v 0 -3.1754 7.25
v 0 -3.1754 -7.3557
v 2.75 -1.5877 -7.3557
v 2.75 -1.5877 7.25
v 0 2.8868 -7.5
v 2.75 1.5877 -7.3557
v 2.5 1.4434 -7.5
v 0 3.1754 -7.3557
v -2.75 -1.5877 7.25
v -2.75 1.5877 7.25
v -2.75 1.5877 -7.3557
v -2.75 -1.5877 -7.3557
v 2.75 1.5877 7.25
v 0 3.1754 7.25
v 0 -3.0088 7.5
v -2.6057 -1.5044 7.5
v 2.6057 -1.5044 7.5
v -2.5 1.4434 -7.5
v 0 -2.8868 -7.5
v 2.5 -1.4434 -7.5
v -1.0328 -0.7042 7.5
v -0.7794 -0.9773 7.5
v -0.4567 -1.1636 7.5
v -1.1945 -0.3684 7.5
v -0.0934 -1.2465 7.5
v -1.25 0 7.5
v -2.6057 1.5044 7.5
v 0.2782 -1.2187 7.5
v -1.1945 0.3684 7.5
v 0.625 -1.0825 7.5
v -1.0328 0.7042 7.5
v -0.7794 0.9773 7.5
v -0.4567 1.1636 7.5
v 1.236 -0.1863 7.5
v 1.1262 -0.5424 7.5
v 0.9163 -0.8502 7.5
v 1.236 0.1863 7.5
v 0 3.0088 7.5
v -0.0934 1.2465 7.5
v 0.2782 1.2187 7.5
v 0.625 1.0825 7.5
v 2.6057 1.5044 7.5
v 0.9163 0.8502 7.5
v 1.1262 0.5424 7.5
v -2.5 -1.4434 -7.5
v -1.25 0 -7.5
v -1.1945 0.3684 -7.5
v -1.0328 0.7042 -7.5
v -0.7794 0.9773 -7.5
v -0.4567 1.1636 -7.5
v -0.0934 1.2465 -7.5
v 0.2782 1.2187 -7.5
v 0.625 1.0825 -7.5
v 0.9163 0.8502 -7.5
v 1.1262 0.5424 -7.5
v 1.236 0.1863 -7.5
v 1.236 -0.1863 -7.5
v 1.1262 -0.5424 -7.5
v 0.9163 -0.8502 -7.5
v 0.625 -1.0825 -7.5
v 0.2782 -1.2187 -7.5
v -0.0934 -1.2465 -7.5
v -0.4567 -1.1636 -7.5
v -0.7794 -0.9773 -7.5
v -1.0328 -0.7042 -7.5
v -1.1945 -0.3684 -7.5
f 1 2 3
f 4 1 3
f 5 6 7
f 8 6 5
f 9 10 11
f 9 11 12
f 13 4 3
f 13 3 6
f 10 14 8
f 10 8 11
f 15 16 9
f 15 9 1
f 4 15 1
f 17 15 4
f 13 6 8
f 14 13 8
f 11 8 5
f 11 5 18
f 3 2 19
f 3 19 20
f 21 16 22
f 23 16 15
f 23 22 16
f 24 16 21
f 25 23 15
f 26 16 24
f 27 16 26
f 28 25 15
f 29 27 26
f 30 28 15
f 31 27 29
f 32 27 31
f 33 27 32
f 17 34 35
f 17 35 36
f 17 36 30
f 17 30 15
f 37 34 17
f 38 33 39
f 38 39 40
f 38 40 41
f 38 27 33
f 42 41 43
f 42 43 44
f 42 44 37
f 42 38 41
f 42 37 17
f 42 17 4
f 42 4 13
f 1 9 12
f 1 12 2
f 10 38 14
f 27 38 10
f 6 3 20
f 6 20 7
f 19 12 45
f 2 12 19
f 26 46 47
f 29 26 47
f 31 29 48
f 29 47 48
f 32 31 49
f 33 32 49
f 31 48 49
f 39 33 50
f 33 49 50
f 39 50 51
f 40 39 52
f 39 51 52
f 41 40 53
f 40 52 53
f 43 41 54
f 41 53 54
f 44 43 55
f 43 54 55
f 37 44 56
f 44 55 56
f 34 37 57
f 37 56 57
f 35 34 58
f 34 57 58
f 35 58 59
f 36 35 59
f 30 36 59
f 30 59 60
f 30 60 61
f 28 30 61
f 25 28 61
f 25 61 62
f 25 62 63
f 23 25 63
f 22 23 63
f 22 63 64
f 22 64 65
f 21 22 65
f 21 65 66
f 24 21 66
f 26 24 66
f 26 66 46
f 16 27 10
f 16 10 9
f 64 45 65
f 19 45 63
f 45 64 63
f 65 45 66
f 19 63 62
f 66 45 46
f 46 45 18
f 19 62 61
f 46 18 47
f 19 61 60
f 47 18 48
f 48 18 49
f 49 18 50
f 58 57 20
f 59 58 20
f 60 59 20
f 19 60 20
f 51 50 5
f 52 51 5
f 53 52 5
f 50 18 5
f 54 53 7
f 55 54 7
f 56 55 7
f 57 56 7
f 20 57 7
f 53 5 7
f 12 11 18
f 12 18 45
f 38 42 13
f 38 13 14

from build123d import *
from OCP.BRepFilletAPI import BRepFilletAPI_MakeChamfer

# Parameters (mm, degrees)
EXTRUDE_1_DEPTH    = 7.5
HOLE_WIZARD_M3_1_D = 2.5
CHAMFER_2_SIZE     = 0.25
CHAMFER_2_SIZE2    = 0.144337567


with BuildPart() as part:
    # ｽｹｯﾁ1 → ﾎﾞｽ - 押し出し1 (new, symmetric)
    with BuildSketch(Plane.XY):
        Polygon((-2.75, 1.58771324), (-2.75, -1.58771324), (0, -3.175426481), (2.75, -1.58771324), (2.75, 1.58771324), (0, 3.175426481), align=None)
    extrude(amount=EXTRUDE_1_DEPTH, both=True)

    # M3 ねじ穴1 (through all)
    with Locations(Plane.XY.offset(7.5)):
        with Locations((0, 0)):
            Hole(HOLE_WIZARD_M3_1_D / 2)

    # 面取り2: one chamfer whose edges measure the first distance from different faces: ONE call of the kernel's chamfer builder (chamfer() names one face for all edges)
    chamfer_2_edges_1 = [part.edges().sort_by_distance(p)[0] for p in [
        (-1.375, -2.38156986, 7.5),
    ]]
    chamfer_2_side_1 = [part.faces().sort_by_distance(p)[0] for p in [
        (-1.375, -2.38156986, 0),
    ]]
    chamfer_2_edges_2 = [part.edges().sort_by_distance(p)[0] for p in [
        (1.375, -2.38156986, 7.5),
    ]]
    chamfer_2_side_2 = [part.faces().sort_by_distance(p)[0] for p in [
        (1.375, -2.38156986, 0),
    ]]
    chamfer_2_edges_3 = [part.edges().sort_by_distance(p)[0] for p in [
        (2.75, 0, 7.5),
    ]]
    chamfer_2_side_3 = [part.faces().sort_by_distance(p)[0] for p in [
        (2.75, 0, 0),
    ]]
    chamfer_2_edges_4 = [part.edges().sort_by_distance(p)[0] for p in [
        (1.375, 2.38156986, 7.5),
    ]]
    chamfer_2_side_4 = [part.faces().sort_by_distance(p)[0] for p in [
        (1.375, 2.38156986, 0),
    ]]
    chamfer_2_edges_5 = [part.edges().sort_by_distance(p)[0] for p in [
        (-1.375, 2.38156986, 7.5),
    ]]
    chamfer_2_side_5 = [part.faces().sort_by_distance(p)[0] for p in [
        (-1.375, 2.38156986, 0),
    ]]
    chamfer_2_edges_6 = [part.edges().sort_by_distance(p)[0] for p in [
        (1.375, 2.38156986, -7.5),
        (2.75, 0, -7.5),
        (1.375, -2.38156986, -7.5),
        (-1.375, -2.38156986, -7.5),
        (-2.75, 0, -7.5),
        (-1.375, 2.38156986, -7.5),
    ]]
    chamfer_2_side_6 = [part.faces().sort_by_distance(p)[0] for p in [
        (-2.665986112, 0, -7.5),
    ]]
    chamfer_2_edges_7 = [part.edges().sort_by_distance(p)[0] for p in [
        (-2.75, 0, 7.5),
    ]]
    chamfer_2_side_7 = [part.faces().sort_by_distance(p)[0] for p in [
        (-2.75, 0, 0),
    ]]
    chamfer_2 = BRepFilletAPI_MakeChamfer(part.part.solid().wrapped)
    for e in chamfer_2_edges_1:
        chamfer_2.Add(CHAMFER_2_SIZE, CHAMFER_2_SIZE2, e.wrapped, chamfer_2_side_1[0].wrapped)  # the first distance lies on this face
    for e in chamfer_2_edges_2:
        chamfer_2.Add(CHAMFER_2_SIZE, CHAMFER_2_SIZE2, e.wrapped, chamfer_2_side_2[0].wrapped)  # the first distance lies on this face
    for e in chamfer_2_edges_3:
        chamfer_2.Add(CHAMFER_2_SIZE, CHAMFER_2_SIZE2, e.wrapped, chamfer_2_side_3[0].wrapped)  # the first distance lies on this face
    for e in chamfer_2_edges_4:
        chamfer_2.Add(CHAMFER_2_SIZE, CHAMFER_2_SIZE2, e.wrapped, chamfer_2_side_4[0].wrapped)  # the first distance lies on this face
    for e in chamfer_2_edges_5:
        chamfer_2.Add(CHAMFER_2_SIZE, CHAMFER_2_SIZE2, e.wrapped, chamfer_2_side_5[0].wrapped)  # the first distance lies on this face
    for e in chamfer_2_edges_6:
        chamfer_2.Add(CHAMFER_2_SIZE, CHAMFER_2_SIZE2, e.wrapped, chamfer_2_side_6[0].wrapped)  # the first distance lies on this face
    for e in chamfer_2_edges_7:
        chamfer_2.Add(CHAMFER_2_SIZE, CHAMFER_2_SIZE2, e.wrapped, chamfer_2_side_7[0].wrapped)  # the first distance lies on this face
    add(Compound.cast(chamfer_2.Shape()), mode=Mode.REPLACE)


solid = part.part
